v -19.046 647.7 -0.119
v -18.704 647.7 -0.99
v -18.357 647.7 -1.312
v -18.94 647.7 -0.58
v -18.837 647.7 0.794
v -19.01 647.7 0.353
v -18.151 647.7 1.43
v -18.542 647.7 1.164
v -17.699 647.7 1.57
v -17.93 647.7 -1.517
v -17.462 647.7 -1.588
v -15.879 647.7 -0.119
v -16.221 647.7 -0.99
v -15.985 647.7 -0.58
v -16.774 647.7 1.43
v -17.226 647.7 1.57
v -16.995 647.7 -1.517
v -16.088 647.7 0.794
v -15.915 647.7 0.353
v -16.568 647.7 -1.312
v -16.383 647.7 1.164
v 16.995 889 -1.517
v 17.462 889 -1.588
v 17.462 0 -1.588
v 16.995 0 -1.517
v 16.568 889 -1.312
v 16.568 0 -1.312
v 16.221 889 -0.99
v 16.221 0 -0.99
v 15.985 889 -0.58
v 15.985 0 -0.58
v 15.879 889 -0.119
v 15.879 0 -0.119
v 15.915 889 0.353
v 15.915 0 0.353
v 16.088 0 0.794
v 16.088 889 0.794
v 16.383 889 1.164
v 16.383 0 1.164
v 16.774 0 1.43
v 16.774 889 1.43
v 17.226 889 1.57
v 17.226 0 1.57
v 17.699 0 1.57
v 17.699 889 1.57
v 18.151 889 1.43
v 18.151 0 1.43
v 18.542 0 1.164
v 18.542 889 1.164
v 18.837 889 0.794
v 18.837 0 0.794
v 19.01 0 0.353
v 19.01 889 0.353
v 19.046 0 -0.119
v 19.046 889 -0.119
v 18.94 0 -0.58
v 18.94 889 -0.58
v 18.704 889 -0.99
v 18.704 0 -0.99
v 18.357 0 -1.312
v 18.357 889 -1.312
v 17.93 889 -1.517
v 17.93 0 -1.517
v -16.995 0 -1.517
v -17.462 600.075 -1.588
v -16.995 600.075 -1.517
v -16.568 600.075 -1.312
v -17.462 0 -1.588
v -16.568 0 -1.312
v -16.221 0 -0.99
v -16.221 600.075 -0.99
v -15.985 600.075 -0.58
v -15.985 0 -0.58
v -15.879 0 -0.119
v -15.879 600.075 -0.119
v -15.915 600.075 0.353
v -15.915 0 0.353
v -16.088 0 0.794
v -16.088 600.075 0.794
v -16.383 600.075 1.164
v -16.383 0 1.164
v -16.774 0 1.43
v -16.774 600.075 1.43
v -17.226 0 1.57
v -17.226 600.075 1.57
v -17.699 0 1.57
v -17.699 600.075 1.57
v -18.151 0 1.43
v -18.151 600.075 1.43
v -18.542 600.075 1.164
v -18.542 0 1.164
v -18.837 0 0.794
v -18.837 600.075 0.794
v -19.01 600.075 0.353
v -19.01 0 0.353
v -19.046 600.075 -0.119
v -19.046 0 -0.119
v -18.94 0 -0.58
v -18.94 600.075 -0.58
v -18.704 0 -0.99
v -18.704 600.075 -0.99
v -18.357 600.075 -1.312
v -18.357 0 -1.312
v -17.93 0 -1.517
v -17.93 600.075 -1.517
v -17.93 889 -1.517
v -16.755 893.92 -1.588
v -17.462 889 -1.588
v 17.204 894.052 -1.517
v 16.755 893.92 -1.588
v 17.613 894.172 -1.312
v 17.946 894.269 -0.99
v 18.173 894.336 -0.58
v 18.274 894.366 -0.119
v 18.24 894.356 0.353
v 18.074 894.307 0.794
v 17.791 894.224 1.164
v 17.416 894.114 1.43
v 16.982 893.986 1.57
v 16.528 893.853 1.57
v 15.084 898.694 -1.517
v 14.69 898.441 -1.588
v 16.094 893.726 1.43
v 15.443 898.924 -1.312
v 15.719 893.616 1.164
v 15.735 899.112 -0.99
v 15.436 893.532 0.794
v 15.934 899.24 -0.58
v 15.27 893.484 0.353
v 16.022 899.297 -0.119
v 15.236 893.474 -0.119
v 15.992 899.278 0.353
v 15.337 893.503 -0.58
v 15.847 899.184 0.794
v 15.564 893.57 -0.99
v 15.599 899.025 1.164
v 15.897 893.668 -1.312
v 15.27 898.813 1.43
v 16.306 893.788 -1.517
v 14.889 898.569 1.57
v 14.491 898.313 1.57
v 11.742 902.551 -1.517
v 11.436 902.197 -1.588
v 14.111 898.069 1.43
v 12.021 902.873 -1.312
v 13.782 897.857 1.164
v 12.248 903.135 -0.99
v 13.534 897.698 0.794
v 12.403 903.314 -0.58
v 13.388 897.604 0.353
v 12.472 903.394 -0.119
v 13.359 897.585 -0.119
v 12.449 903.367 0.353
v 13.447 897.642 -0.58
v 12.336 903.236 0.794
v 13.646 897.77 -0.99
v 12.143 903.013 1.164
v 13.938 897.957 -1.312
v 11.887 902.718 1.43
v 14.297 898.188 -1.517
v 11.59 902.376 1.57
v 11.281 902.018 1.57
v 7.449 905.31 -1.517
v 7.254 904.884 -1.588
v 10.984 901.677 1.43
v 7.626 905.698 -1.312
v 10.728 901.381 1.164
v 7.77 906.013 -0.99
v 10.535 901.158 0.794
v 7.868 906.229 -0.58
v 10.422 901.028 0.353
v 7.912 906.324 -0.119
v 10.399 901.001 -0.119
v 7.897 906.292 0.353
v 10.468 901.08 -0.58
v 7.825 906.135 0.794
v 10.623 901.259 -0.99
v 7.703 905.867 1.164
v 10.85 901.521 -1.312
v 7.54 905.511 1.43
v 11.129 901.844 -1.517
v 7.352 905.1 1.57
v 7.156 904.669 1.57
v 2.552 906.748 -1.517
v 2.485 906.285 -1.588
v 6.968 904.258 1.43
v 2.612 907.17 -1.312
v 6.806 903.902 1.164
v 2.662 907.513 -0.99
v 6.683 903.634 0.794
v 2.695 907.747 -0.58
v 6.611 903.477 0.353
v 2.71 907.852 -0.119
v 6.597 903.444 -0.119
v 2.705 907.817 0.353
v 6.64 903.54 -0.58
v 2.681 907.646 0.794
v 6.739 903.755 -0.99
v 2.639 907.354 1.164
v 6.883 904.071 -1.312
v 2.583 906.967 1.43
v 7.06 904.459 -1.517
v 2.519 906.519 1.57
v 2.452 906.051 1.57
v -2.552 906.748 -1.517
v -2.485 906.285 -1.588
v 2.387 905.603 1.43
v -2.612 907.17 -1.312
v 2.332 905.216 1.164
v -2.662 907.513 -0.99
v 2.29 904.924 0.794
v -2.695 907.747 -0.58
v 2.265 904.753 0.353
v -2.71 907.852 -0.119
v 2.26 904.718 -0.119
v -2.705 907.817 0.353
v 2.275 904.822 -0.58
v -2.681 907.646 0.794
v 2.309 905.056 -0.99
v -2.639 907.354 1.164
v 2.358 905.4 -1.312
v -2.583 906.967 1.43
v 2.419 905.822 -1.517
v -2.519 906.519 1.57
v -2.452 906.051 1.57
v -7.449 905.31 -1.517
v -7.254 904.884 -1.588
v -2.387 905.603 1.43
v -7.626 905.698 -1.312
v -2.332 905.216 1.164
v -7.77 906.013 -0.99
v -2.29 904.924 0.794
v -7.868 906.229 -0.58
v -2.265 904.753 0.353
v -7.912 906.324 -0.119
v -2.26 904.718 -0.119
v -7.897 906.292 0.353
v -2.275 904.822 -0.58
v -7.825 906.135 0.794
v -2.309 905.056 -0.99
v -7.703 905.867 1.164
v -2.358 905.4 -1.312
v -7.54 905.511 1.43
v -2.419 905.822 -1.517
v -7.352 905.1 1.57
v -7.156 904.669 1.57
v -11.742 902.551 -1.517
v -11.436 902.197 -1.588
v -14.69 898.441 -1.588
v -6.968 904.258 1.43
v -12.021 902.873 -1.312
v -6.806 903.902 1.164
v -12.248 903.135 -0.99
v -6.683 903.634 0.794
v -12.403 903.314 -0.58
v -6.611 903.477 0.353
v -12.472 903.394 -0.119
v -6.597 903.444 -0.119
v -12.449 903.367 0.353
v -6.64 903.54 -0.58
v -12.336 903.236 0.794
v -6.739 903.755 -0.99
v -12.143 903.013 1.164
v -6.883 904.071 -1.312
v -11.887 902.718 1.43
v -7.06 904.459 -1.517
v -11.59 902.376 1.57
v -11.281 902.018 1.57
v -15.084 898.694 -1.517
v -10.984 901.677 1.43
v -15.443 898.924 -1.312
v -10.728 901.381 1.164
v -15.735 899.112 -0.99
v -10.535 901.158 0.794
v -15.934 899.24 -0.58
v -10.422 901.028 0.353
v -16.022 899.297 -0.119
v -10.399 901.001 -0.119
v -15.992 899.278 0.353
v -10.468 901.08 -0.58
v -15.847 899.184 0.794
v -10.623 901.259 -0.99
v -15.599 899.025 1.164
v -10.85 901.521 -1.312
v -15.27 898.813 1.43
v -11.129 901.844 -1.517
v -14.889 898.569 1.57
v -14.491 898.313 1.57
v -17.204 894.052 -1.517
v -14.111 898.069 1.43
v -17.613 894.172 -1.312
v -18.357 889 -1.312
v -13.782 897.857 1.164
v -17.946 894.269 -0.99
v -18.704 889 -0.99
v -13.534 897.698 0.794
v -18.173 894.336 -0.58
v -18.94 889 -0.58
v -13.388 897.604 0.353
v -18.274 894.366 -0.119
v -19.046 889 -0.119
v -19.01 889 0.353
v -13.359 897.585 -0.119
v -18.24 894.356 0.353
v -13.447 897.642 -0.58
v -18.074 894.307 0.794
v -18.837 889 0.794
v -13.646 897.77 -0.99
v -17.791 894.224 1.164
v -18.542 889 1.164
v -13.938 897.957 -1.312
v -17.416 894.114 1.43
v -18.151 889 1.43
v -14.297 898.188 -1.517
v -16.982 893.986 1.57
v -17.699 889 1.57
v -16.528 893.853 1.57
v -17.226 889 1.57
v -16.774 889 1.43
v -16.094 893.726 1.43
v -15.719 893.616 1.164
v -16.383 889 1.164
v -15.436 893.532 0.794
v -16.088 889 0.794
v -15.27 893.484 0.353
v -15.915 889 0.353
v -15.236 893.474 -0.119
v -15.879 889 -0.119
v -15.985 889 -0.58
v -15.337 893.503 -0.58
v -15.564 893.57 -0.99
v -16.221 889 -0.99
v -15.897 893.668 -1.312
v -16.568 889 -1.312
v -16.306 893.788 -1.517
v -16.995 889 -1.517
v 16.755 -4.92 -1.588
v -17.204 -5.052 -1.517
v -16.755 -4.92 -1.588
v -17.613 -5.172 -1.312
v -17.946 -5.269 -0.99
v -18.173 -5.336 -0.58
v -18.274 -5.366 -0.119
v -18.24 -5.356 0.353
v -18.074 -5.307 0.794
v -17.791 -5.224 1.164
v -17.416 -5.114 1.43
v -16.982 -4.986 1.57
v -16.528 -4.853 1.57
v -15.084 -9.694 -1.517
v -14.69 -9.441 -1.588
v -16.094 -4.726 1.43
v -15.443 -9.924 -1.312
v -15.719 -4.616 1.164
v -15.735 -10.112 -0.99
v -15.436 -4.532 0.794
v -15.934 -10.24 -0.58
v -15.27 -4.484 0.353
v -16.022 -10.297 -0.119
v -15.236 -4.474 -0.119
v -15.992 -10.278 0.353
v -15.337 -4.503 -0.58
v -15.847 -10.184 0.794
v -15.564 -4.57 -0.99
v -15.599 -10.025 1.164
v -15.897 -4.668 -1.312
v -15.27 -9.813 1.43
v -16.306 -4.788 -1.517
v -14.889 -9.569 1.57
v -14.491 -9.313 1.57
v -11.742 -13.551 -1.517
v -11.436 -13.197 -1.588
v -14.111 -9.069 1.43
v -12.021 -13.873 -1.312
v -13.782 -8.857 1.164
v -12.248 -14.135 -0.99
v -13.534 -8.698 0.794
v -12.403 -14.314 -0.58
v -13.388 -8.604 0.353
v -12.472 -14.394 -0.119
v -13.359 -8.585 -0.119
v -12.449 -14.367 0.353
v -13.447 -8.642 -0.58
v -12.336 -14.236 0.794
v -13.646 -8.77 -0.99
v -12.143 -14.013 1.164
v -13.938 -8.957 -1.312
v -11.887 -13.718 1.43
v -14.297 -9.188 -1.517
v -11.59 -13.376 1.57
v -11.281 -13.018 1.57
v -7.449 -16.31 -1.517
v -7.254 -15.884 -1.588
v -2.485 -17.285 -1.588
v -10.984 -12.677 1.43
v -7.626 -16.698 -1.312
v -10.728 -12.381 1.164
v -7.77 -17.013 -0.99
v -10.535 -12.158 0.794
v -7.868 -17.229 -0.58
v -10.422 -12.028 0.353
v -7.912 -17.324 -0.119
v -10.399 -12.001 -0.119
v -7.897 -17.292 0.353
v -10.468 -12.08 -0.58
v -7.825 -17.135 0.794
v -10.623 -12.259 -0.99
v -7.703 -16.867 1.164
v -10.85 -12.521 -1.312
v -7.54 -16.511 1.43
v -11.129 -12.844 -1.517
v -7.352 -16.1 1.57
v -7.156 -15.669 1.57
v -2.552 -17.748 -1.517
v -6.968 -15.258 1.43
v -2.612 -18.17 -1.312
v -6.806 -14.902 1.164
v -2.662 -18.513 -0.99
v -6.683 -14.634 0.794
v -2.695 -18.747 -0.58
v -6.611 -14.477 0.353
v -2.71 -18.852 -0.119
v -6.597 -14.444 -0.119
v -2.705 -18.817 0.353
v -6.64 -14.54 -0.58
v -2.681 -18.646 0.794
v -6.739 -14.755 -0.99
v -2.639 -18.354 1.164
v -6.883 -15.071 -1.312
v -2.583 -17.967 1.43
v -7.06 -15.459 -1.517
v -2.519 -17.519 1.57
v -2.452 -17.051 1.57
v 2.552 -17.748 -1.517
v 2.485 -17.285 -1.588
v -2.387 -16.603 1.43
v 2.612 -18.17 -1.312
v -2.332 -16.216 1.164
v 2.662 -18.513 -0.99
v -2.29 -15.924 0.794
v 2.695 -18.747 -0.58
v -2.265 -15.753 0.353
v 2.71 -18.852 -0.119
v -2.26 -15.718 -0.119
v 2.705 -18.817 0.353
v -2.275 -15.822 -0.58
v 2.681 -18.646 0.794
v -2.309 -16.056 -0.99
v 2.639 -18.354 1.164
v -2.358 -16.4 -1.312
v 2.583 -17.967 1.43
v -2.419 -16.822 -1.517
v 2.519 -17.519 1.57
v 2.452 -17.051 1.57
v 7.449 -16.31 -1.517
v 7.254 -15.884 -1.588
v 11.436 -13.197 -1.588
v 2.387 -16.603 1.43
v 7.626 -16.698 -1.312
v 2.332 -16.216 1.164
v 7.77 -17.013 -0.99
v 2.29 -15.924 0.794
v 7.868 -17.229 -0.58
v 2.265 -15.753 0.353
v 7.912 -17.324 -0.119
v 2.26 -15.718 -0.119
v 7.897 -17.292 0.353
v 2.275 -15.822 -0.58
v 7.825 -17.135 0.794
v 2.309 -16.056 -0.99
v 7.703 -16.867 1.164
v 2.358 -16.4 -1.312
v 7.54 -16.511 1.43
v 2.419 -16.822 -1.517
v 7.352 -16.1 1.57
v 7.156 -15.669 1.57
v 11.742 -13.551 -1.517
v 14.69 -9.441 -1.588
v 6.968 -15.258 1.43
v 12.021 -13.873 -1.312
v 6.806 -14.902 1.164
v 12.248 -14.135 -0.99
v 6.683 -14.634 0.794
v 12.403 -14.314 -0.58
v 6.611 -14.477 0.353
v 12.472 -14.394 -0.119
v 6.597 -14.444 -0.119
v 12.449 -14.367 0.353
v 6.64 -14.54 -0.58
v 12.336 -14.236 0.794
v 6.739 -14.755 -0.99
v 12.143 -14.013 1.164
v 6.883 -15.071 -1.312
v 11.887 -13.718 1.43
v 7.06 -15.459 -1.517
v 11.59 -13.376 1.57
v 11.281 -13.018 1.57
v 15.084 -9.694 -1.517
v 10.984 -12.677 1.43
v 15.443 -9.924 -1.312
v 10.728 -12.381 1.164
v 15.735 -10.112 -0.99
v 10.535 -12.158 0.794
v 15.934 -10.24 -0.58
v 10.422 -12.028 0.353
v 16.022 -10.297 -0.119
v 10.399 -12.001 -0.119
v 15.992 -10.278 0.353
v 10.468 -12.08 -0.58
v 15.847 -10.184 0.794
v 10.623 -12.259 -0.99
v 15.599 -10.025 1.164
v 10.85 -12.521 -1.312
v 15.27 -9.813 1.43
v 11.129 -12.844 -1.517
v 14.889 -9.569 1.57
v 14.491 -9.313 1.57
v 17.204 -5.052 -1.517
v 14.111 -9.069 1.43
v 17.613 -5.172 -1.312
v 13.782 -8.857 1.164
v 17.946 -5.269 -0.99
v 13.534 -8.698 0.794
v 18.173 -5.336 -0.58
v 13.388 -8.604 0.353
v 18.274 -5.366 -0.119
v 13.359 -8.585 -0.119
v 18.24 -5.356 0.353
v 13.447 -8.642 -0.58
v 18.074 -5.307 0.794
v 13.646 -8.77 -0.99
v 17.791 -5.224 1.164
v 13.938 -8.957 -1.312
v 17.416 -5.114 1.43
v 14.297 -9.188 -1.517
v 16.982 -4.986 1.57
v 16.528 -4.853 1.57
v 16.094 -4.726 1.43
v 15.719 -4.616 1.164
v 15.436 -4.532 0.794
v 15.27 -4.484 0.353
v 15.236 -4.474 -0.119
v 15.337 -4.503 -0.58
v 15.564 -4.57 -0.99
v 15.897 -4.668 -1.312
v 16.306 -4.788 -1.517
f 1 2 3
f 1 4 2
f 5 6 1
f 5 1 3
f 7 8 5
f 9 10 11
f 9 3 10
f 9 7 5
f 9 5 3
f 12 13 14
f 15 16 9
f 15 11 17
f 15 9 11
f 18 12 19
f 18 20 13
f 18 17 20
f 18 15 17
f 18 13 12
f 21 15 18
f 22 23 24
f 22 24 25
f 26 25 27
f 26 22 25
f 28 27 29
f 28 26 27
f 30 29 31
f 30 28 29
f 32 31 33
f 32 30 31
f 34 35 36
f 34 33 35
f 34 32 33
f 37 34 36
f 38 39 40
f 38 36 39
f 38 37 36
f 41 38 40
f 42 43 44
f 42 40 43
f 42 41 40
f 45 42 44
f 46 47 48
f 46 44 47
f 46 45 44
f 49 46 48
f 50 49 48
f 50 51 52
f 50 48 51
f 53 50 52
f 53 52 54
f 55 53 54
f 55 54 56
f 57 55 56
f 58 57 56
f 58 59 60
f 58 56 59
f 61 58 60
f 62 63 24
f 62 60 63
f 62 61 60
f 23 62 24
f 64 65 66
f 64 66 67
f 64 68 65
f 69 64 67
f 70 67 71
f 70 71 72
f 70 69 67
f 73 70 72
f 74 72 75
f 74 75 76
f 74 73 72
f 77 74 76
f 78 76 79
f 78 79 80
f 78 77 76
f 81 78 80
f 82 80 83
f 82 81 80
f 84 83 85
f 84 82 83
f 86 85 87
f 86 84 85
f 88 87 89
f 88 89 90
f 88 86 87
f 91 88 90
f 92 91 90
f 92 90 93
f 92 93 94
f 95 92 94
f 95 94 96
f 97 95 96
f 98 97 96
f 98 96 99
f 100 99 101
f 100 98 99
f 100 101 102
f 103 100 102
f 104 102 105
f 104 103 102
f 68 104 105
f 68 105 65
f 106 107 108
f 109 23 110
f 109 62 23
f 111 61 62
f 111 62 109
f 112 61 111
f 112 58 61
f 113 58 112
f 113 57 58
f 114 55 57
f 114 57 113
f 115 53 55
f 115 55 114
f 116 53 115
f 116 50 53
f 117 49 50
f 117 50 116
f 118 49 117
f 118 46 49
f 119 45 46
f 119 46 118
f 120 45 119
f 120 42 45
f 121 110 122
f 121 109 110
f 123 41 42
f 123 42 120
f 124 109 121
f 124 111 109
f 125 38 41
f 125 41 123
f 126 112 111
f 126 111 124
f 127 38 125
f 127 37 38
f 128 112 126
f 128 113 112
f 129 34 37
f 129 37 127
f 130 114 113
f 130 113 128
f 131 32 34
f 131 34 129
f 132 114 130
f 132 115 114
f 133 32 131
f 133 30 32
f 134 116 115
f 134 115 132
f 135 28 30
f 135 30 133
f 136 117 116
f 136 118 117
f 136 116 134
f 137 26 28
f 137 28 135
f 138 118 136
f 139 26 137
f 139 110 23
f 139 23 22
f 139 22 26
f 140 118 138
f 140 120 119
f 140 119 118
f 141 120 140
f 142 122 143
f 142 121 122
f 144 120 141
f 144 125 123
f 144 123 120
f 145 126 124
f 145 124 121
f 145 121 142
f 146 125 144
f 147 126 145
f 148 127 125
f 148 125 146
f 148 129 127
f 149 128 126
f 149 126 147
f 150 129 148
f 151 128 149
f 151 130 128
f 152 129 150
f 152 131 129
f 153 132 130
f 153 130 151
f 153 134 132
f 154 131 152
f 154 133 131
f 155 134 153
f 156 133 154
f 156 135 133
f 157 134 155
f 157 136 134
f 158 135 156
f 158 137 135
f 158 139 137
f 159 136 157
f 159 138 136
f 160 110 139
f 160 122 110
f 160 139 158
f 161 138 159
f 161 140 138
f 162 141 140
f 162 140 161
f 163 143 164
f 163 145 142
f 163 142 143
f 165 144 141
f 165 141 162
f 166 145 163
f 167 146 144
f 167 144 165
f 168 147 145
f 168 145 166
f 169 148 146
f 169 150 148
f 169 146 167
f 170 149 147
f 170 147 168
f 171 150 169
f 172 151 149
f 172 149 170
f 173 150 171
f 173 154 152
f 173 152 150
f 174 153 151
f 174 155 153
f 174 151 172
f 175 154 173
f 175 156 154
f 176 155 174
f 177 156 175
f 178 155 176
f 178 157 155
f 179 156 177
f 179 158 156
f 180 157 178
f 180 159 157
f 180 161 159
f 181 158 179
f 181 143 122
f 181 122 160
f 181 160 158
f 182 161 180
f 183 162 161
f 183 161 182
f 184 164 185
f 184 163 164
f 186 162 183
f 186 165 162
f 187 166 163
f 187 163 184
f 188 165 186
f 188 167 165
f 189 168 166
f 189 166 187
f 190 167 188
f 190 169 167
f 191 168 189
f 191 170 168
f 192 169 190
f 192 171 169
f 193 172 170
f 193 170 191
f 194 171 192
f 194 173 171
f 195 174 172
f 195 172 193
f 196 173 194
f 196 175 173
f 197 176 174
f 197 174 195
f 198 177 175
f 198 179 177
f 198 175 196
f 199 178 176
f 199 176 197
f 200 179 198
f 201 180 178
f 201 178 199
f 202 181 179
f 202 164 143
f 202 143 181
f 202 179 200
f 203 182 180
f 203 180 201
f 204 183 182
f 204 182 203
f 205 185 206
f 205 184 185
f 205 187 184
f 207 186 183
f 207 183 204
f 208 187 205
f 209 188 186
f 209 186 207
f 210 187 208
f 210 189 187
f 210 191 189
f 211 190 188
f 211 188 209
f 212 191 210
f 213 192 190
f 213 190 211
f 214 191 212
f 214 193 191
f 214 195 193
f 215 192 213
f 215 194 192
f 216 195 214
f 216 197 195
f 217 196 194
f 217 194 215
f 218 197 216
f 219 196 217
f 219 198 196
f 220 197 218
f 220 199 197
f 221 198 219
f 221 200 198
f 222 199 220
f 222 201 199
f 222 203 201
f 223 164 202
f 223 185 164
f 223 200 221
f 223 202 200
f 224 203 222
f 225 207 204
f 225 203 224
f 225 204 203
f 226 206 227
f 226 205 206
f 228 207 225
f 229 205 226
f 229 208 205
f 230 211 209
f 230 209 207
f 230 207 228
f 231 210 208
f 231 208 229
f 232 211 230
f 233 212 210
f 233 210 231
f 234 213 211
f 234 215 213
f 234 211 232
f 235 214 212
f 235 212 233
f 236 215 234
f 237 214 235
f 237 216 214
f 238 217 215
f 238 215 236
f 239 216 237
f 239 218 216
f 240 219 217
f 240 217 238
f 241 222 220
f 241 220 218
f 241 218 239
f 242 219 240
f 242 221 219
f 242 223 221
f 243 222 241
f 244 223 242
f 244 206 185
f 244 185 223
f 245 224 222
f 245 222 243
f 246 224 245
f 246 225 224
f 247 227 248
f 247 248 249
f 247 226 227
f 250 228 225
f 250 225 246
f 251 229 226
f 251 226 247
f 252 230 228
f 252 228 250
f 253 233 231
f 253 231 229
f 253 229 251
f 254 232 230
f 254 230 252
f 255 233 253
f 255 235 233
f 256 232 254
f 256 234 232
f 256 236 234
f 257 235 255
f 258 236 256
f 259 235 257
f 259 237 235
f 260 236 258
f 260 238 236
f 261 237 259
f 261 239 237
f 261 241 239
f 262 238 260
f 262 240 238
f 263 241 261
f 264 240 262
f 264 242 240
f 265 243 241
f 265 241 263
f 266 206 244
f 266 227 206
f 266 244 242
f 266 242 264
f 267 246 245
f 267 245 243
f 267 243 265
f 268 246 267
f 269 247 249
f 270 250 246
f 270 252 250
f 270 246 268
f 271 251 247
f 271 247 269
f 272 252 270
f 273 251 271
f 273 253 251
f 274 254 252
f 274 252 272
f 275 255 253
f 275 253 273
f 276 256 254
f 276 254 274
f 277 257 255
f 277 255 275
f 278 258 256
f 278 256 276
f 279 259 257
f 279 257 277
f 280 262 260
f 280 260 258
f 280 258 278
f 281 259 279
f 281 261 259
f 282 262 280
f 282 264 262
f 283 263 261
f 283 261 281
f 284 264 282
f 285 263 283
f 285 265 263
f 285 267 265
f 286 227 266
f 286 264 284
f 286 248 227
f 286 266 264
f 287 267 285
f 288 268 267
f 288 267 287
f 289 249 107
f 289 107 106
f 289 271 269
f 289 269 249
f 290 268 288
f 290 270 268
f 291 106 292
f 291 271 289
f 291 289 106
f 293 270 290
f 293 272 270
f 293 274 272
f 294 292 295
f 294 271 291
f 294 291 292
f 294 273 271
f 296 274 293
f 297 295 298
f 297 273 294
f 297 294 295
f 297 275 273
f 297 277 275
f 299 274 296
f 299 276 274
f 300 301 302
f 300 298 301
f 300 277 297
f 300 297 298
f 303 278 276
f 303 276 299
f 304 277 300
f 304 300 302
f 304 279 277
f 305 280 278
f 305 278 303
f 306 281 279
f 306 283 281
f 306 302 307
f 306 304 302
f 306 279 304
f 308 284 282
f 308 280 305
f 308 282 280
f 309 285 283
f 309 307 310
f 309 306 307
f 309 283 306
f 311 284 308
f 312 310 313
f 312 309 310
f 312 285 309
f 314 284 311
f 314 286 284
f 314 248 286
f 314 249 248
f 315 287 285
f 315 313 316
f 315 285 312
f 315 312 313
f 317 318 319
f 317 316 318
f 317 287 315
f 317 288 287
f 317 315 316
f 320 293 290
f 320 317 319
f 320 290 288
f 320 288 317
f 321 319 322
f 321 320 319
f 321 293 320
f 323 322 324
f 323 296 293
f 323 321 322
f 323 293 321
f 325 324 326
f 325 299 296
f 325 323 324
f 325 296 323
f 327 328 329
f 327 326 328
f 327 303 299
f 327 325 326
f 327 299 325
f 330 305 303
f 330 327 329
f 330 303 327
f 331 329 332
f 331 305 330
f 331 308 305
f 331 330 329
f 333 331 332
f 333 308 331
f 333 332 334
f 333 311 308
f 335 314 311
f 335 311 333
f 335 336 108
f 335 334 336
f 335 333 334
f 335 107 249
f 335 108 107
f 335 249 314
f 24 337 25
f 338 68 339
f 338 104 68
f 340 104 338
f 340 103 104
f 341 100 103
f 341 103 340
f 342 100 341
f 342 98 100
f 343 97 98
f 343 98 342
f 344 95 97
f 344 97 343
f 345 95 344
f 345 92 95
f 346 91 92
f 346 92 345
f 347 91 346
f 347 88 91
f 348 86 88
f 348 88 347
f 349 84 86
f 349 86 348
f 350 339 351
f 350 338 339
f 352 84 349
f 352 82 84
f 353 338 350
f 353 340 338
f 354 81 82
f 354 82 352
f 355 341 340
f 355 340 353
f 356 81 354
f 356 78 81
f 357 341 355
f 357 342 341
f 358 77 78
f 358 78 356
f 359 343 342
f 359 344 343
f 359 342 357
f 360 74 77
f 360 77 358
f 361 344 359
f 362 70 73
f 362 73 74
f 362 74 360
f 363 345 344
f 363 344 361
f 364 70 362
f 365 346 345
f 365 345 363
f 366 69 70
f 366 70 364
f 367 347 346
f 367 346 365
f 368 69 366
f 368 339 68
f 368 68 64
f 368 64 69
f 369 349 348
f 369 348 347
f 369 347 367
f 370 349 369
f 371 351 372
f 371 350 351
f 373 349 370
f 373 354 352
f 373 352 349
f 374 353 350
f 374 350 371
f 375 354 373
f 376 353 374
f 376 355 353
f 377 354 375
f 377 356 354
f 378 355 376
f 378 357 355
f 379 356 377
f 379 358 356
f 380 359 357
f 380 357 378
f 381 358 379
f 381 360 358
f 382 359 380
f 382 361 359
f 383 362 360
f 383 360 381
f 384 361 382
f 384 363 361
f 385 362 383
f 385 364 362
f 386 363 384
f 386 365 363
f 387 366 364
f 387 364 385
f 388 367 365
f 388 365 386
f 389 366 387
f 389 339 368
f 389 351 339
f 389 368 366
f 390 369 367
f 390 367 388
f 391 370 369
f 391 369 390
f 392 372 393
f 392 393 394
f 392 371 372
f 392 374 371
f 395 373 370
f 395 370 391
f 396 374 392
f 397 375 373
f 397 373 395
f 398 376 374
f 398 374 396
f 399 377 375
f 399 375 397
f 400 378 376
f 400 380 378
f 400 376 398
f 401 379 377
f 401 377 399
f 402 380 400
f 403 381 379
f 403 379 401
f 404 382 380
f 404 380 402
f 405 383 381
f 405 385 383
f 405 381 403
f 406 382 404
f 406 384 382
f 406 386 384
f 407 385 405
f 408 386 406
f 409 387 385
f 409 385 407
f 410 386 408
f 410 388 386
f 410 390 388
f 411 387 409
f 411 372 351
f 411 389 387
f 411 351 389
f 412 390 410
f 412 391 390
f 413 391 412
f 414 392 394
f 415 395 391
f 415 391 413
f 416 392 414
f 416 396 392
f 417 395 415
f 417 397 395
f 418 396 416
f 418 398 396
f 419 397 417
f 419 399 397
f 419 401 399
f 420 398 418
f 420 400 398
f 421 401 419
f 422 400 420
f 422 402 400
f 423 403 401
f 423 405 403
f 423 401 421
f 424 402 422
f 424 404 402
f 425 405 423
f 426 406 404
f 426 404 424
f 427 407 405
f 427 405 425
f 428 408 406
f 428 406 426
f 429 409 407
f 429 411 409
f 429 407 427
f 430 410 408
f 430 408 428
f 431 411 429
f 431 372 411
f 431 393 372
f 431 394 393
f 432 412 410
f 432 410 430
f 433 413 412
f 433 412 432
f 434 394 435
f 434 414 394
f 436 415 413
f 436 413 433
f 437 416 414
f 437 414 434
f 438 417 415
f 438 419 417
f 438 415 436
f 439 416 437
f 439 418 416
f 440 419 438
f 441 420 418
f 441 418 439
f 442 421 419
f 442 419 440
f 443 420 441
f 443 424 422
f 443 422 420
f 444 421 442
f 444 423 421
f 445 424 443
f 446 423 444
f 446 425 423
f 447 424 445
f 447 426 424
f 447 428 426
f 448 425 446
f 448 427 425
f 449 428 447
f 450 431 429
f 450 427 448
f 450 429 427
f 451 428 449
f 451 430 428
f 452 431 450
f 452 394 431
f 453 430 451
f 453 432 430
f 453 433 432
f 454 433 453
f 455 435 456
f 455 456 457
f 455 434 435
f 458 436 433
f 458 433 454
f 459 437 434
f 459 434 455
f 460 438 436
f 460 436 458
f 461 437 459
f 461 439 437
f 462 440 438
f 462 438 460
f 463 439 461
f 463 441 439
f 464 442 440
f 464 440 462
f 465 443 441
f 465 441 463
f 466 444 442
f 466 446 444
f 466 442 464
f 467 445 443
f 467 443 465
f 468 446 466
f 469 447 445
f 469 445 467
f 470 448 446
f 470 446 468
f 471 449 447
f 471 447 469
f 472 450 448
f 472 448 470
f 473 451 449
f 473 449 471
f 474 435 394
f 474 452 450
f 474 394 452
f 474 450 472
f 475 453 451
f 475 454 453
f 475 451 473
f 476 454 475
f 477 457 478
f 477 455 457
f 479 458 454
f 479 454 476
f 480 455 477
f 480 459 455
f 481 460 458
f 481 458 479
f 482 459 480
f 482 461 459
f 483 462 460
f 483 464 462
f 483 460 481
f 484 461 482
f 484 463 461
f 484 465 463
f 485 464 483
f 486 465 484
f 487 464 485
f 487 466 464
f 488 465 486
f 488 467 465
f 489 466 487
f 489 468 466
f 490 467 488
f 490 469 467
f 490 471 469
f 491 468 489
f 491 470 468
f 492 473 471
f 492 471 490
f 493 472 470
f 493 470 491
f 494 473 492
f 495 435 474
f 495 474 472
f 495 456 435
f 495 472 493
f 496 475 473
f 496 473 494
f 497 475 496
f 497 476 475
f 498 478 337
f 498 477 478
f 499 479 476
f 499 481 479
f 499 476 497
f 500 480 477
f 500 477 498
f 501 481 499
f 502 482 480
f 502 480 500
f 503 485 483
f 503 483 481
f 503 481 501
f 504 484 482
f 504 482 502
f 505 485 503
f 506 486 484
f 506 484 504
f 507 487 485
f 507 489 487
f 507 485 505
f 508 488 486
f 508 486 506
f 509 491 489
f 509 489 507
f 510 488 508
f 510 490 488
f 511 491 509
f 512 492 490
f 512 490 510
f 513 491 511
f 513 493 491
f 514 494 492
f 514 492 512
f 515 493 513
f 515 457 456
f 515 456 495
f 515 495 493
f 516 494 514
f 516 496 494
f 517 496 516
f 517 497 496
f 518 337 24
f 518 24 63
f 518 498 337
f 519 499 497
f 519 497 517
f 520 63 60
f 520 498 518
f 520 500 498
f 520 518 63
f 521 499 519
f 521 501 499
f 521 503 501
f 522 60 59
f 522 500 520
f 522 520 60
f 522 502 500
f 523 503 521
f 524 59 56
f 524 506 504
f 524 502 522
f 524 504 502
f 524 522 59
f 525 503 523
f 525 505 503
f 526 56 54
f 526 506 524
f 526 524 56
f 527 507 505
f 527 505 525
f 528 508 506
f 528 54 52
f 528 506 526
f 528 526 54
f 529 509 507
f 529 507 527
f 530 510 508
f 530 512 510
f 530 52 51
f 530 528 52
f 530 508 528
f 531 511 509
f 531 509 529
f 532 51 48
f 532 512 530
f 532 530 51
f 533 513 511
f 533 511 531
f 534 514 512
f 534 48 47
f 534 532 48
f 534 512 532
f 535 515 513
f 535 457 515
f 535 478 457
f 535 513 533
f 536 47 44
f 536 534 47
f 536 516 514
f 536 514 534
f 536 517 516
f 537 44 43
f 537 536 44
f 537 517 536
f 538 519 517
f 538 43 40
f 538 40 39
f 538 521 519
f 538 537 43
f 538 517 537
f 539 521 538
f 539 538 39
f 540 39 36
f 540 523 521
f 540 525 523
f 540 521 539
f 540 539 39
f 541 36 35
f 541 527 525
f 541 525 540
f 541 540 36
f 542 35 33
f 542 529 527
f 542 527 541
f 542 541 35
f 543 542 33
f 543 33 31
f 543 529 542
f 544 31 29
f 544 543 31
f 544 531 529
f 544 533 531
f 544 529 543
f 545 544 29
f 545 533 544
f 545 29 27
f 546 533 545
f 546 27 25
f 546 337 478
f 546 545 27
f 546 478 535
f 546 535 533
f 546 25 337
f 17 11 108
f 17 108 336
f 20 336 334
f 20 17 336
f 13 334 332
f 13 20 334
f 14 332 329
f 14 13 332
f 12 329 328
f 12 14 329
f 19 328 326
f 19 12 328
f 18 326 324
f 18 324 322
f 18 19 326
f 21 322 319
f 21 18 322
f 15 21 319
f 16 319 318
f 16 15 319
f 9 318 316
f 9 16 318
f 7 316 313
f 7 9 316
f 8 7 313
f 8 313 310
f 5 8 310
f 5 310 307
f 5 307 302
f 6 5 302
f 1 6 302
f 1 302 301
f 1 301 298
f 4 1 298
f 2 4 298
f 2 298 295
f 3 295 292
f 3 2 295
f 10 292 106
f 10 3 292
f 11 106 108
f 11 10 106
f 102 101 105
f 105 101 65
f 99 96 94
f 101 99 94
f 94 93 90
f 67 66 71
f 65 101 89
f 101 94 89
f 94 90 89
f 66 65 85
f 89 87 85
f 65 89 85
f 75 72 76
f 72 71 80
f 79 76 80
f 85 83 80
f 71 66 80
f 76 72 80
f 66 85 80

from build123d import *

# Parameters (mm, degrees)
SKETCH2_R               = 1.5875
SKETCH3_W               = 36.037797304
SKETCH3_H               = 47.625
CUT_EXTRUDE1_DEPTH      = 2.5875001
CUT_EXTRUDE1_DEPTH_BACK = 2.5875001


with BuildPart() as part:
    # Sweep1: sweep along a path in Sketch1
    with BuildLine(Plane.XY) as sweep1_path:
        Line((-17.4625, 889), (-17.4625, 0))
        ThreePointArc((-17.4625, 0), (0, -17.4625), (17.4625, 0))
        Line((17.4625, 0), (17.4625, 889))
        ThreePointArc((17.4625, 889), (0, 906.4625), (-17.4625, 889))
    # Sketch2 → Sweep1 (sweep)
    with BuildSketch(Plane(origin=(0, 0, 0), x_dir=(0, 0, -1), z_dir=(1, 0, 0))):
        with Locations((0, 906.4625)):
            Circle(SKETCH2_R)
    sweep(path=sweep1_path.line)

    # Sketch3 → Cut-Extrude1 (cut, two sides)
    with BuildSketch(Plane.XY) as cut_extrude1_sk:
        with Locations((-20.239587833, 623.8875)):
            Rectangle(SKETCH3_W, SKETCH3_H)
    extrude(amount=CUT_EXTRUDE1_DEPTH, mode=Mode.SUBTRACT)
    extrude(cut_extrude1_sk.sketch, amount=-CUT_EXTRUDE1_DEPTH_BACK, mode=Mode.SUBTRACT)


solid = part.part
